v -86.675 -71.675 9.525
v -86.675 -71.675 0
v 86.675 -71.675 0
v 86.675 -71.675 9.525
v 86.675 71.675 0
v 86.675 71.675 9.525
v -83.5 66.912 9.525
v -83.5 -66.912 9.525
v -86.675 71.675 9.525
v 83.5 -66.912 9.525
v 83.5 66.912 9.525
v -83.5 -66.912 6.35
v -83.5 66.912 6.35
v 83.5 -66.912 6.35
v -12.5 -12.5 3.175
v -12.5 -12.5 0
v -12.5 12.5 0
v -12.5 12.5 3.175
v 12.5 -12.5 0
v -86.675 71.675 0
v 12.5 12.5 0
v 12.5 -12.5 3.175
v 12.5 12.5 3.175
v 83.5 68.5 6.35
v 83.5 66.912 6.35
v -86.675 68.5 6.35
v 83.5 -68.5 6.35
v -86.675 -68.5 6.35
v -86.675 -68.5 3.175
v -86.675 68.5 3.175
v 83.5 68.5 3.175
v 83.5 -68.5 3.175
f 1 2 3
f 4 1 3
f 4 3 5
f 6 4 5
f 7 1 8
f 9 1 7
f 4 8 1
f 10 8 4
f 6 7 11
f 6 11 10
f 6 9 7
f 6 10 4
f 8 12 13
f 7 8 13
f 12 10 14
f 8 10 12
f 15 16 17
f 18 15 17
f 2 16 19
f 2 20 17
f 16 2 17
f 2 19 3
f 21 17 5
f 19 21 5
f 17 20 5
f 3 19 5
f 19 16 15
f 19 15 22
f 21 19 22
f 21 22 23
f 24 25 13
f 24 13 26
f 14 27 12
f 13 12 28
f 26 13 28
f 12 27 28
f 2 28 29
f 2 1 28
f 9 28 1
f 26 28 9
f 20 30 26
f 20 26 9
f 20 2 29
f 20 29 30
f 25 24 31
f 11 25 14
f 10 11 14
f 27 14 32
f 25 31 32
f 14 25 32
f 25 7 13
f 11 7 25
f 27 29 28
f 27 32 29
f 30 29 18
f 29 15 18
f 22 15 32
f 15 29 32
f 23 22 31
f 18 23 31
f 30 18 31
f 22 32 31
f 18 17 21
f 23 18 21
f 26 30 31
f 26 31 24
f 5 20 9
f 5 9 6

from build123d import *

# Parameters (mm, degrees)
F0_W     = 25
F0_H     = 25
F1_DEPTH = 3.175
F0_W_2   = 173.35
F0_H_2   = 143.35
F2_DEPTH = 9.525
F3_W     = 137
F3_H     = 3.175
F4_DEPTH = 25.4
F5_W     = 167
F5_H     = 3.175
F6_DEPTH = 1.5875
F7_W     = 167
F7_H     = 3.175
F8_DEPTH = 1.5875


with BuildPart() as f1:
    # F0 (on Top) → F1 (new body)
    with BuildSketch(Plane.XY):
        Polygon((-41.7, 68.5), (-67.1, 68.5), (-83.5, 68.5), (-83.5, 52.1), (-83.5, 26.7), (-83.5, -24.1), (-83.5, -49.5), (-83.5, -68.5), (-67.1, -68.5), (-41.7, -68.5), (-16.3, -68.5), (9.1, -68.5), (34.5, -68.5), (59.9, -68.5), (83.5, -68.5), (83.5, -49.5), (83.5, -24.1), (83.5, 26.7), (83.5, 52.1), (83.5, 68.5), (59.9, 68.5), (34.5, 68.5), (9.1, 68.5), (-16.3, 68.5), align=None)
        Rectangle(F0_W, F0_H, mode=Mode.SUBTRACT)
    extrude(amount=F1_DEPTH)

    # F0 (on Top) → F2 (join)
    with BuildSketch(Plane.XY):
        Rectangle(F0_W_2, F0_H_2)
        Polygon((-83.5, 68.5), (-67.1, 68.5), (-41.7, 68.5), (-16.3, 68.5), (9.1, 68.5), (34.5, 68.5), (59.9, 68.5), (83.5, 68.5), (83.5, 52.1), (83.5, 26.7), (83.5, -24.1), (83.5, -49.5), (83.5, -68.5), (59.9, -68.5), (34.5, -68.5), (9.1, -68.5), (-16.3, -68.5), (-41.7, -68.5), (-67.1, -68.5), (-83.5, -68.5), (-83.5, -49.5), (-83.5, -24.1), (-83.5, 26.7), (-83.5, 52.1), align=None, mode=Mode.SUBTRACT)
    extrude(amount=F2_DEPTH)

    # F3 (on face) → F4 (cut)
    with BuildSketch(Plane.YZ.offset(-83.5)):
        with Locations((0, 4.7625)):
            Rectangle(F3_W, F3_H)
    extrude(amount=-F4_DEPTH, mode=Mode.SUBTRACT)

    # F5 (on face) → F6 (join)
    with BuildSketch(Plane.XZ.offset(-68.5)):
        with Locations((0, 7.9375)):
            Rectangle(F5_W, F5_H)
    extrude(amount=F6_DEPTH)

    # F7 (on face) → F8 (join)
    with BuildSketch(Plane(origin=(0, -68.5, 0), x_dir=(-1, 0, 0), z_dir=(0, 1, 0))):
        with Locations((0, 7.9375)):
            Rectangle(F7_W, F7_H)
    extrude(amount=F8_DEPTH)


solid = f1.part
